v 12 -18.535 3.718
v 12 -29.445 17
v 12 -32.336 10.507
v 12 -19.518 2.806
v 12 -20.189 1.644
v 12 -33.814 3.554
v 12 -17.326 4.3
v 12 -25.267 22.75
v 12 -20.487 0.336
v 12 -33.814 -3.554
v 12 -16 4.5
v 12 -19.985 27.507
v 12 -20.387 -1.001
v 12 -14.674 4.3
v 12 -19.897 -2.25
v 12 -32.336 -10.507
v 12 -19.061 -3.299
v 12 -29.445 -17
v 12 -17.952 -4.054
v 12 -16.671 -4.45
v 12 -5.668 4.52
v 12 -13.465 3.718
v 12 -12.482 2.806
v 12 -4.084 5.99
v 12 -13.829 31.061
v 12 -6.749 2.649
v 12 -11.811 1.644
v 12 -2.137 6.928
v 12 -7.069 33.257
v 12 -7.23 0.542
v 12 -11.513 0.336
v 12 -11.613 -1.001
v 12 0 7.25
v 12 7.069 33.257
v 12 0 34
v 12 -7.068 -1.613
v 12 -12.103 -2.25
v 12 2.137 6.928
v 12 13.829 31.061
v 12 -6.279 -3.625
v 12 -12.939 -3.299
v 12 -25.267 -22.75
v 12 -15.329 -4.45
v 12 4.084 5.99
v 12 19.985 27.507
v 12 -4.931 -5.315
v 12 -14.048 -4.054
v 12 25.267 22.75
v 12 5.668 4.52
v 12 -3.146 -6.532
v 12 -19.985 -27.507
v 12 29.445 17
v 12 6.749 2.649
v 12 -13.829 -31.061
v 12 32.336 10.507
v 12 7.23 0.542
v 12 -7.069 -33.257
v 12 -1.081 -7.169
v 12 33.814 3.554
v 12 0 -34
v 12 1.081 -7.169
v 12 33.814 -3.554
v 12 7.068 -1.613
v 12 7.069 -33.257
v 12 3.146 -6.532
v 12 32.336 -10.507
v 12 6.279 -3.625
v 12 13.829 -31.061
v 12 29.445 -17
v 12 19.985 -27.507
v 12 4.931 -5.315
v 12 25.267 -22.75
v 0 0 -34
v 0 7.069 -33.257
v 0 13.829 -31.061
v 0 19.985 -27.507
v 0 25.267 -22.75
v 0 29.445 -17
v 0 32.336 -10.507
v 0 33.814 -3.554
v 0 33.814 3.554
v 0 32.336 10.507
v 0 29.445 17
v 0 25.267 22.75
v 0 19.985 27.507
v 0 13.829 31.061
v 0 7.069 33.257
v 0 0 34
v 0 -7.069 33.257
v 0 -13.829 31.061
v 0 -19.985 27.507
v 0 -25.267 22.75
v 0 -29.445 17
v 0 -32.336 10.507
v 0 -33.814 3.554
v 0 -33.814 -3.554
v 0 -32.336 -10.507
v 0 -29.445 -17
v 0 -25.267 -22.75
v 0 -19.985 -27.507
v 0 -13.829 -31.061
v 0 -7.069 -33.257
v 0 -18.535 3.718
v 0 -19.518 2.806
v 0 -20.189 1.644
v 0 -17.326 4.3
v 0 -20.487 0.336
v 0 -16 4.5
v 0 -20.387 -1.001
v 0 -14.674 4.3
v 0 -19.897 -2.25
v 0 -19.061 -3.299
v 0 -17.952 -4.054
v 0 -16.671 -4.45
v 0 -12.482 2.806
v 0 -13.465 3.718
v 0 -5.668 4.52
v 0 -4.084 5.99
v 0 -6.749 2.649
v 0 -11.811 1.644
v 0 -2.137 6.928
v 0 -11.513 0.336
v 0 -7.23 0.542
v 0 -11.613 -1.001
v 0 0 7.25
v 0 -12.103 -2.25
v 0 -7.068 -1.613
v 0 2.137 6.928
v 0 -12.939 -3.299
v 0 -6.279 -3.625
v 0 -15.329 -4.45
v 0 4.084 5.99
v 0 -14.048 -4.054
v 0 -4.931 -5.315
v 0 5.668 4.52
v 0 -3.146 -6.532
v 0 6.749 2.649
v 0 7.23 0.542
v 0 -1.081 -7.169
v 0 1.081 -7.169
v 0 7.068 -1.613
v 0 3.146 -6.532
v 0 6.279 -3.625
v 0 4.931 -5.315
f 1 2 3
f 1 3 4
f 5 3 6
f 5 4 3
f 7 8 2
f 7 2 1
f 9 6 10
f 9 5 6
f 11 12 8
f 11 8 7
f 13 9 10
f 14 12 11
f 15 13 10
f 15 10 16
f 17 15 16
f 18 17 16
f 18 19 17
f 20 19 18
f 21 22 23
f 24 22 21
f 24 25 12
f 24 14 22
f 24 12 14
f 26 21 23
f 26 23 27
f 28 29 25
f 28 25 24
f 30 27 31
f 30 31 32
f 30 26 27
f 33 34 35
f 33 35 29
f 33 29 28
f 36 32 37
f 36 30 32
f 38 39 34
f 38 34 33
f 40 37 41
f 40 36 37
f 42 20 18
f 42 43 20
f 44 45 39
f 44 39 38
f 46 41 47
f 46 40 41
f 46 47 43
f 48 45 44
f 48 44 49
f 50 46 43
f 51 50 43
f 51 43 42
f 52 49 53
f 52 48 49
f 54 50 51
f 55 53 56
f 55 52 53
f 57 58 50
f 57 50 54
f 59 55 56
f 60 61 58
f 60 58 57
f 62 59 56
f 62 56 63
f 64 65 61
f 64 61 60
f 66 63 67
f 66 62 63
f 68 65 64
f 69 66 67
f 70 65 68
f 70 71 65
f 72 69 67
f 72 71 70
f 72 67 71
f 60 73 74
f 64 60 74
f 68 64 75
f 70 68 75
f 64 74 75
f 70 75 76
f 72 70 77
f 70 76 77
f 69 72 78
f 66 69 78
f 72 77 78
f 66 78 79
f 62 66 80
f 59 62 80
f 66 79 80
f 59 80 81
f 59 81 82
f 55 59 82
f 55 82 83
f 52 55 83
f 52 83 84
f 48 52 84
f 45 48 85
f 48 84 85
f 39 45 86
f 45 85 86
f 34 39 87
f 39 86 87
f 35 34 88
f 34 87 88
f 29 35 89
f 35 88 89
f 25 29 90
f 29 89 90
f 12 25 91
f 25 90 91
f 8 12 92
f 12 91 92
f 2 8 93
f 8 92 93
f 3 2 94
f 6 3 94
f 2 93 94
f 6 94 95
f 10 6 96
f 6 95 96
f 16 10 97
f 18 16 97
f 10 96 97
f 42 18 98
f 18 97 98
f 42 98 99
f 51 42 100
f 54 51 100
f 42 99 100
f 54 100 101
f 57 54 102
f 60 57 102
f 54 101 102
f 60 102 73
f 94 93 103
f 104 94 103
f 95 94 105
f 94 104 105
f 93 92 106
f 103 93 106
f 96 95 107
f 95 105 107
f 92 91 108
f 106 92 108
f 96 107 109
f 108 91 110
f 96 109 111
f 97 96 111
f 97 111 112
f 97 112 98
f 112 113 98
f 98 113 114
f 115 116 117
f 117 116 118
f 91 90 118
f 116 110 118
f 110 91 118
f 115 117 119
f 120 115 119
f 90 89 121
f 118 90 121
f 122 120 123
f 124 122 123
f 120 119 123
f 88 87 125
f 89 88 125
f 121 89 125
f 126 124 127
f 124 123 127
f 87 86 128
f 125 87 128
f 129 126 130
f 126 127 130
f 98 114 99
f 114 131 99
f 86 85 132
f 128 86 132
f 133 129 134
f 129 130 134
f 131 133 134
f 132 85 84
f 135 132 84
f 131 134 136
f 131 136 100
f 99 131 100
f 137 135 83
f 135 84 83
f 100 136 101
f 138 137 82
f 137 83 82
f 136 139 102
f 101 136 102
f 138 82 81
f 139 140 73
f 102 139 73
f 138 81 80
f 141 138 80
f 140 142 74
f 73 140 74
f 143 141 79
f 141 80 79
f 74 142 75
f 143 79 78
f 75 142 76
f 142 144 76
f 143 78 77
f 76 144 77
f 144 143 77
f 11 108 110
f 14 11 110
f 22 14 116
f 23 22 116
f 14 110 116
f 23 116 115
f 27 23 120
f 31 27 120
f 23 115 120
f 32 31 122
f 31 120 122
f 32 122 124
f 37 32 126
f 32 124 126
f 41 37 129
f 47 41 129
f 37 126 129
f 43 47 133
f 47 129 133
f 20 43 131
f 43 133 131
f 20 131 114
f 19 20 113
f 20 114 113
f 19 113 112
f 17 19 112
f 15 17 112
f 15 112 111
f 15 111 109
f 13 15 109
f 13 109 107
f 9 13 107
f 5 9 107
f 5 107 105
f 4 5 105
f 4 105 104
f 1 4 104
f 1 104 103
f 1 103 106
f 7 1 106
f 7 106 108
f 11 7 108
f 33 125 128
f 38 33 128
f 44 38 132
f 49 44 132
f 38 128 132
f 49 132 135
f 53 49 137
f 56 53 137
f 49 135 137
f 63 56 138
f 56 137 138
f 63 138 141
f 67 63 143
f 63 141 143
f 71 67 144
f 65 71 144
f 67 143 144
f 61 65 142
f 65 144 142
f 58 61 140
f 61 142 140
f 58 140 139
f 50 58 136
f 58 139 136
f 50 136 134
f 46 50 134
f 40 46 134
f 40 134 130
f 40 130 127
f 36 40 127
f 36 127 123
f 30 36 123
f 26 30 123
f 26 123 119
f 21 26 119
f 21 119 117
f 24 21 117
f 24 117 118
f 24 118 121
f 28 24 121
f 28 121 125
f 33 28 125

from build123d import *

# Parameters (mm, degrees)
SKETCH1_R                 = 34
BOSS_EXTRUDE1_DEPTH       = 12
M13_CLEARANCE_HOLE1_D     = 14.5
M13_CLEARANCE_HOLE1_DEPTH = 30
M13_CLEARANCE_HOLE1_TIP   = 4.356239488
M8_CLEARANCE_HOLE1_D      = 9
M8_CLEARANCE_HOLE1_DEPTH  = 30
M8_CLEARANCE_HOLE1_TIP    = 2.703872786


with BuildPart() as part:
    # Sketch1 → Boss-Extrude1 (new body)
    with BuildSketch(Plane(origin=(0, 0, 0), x_dir=(0, 0, -1), z_dir=(1, 0, 0))):
        Circle(SKETCH1_R)
    extrude(amount=BOSS_EXTRUDE1_DEPTH)

    # M13 Clearance Hole1
    with Locations(Plane(origin=(12, 0, 0), x_dir=(0, 0, -1), z_dir=(1, 0, 0))):
        with Locations((0, 0)):
            Hole(M13_CLEARANCE_HOLE1_D / 2, depth=M13_CLEARANCE_HOLE1_DEPTH)
            with Locations((0, 0, -(M13_CLEARANCE_HOLE1_DEPTH + M13_CLEARANCE_HOLE1_TIP / 2))):  # 118° drill point
                Cone(0, M13_CLEARANCE_HOLE1_D / 2, M13_CLEARANCE_HOLE1_TIP, mode=Mode.SUBTRACT)

    # M8 Clearance Hole1
    with Locations(Plane(origin=(12, 0, 0), x_dir=(0, 0, -1), z_dir=(1, 0, 0))):
        with Locations((0, -16)):
            Hole(M8_CLEARANCE_HOLE1_D / 2, depth=M8_CLEARANCE_HOLE1_DEPTH)
            with Locations((0, 0, -(M8_CLEARANCE_HOLE1_DEPTH + M8_CLEARANCE_HOLE1_TIP / 2))):  # 118° drill point
                Cone(0, M8_CLEARANCE_HOLE1_D / 2, M8_CLEARANCE_HOLE1_TIP, mode=Mode.SUBTRACT)


solid = part.part
